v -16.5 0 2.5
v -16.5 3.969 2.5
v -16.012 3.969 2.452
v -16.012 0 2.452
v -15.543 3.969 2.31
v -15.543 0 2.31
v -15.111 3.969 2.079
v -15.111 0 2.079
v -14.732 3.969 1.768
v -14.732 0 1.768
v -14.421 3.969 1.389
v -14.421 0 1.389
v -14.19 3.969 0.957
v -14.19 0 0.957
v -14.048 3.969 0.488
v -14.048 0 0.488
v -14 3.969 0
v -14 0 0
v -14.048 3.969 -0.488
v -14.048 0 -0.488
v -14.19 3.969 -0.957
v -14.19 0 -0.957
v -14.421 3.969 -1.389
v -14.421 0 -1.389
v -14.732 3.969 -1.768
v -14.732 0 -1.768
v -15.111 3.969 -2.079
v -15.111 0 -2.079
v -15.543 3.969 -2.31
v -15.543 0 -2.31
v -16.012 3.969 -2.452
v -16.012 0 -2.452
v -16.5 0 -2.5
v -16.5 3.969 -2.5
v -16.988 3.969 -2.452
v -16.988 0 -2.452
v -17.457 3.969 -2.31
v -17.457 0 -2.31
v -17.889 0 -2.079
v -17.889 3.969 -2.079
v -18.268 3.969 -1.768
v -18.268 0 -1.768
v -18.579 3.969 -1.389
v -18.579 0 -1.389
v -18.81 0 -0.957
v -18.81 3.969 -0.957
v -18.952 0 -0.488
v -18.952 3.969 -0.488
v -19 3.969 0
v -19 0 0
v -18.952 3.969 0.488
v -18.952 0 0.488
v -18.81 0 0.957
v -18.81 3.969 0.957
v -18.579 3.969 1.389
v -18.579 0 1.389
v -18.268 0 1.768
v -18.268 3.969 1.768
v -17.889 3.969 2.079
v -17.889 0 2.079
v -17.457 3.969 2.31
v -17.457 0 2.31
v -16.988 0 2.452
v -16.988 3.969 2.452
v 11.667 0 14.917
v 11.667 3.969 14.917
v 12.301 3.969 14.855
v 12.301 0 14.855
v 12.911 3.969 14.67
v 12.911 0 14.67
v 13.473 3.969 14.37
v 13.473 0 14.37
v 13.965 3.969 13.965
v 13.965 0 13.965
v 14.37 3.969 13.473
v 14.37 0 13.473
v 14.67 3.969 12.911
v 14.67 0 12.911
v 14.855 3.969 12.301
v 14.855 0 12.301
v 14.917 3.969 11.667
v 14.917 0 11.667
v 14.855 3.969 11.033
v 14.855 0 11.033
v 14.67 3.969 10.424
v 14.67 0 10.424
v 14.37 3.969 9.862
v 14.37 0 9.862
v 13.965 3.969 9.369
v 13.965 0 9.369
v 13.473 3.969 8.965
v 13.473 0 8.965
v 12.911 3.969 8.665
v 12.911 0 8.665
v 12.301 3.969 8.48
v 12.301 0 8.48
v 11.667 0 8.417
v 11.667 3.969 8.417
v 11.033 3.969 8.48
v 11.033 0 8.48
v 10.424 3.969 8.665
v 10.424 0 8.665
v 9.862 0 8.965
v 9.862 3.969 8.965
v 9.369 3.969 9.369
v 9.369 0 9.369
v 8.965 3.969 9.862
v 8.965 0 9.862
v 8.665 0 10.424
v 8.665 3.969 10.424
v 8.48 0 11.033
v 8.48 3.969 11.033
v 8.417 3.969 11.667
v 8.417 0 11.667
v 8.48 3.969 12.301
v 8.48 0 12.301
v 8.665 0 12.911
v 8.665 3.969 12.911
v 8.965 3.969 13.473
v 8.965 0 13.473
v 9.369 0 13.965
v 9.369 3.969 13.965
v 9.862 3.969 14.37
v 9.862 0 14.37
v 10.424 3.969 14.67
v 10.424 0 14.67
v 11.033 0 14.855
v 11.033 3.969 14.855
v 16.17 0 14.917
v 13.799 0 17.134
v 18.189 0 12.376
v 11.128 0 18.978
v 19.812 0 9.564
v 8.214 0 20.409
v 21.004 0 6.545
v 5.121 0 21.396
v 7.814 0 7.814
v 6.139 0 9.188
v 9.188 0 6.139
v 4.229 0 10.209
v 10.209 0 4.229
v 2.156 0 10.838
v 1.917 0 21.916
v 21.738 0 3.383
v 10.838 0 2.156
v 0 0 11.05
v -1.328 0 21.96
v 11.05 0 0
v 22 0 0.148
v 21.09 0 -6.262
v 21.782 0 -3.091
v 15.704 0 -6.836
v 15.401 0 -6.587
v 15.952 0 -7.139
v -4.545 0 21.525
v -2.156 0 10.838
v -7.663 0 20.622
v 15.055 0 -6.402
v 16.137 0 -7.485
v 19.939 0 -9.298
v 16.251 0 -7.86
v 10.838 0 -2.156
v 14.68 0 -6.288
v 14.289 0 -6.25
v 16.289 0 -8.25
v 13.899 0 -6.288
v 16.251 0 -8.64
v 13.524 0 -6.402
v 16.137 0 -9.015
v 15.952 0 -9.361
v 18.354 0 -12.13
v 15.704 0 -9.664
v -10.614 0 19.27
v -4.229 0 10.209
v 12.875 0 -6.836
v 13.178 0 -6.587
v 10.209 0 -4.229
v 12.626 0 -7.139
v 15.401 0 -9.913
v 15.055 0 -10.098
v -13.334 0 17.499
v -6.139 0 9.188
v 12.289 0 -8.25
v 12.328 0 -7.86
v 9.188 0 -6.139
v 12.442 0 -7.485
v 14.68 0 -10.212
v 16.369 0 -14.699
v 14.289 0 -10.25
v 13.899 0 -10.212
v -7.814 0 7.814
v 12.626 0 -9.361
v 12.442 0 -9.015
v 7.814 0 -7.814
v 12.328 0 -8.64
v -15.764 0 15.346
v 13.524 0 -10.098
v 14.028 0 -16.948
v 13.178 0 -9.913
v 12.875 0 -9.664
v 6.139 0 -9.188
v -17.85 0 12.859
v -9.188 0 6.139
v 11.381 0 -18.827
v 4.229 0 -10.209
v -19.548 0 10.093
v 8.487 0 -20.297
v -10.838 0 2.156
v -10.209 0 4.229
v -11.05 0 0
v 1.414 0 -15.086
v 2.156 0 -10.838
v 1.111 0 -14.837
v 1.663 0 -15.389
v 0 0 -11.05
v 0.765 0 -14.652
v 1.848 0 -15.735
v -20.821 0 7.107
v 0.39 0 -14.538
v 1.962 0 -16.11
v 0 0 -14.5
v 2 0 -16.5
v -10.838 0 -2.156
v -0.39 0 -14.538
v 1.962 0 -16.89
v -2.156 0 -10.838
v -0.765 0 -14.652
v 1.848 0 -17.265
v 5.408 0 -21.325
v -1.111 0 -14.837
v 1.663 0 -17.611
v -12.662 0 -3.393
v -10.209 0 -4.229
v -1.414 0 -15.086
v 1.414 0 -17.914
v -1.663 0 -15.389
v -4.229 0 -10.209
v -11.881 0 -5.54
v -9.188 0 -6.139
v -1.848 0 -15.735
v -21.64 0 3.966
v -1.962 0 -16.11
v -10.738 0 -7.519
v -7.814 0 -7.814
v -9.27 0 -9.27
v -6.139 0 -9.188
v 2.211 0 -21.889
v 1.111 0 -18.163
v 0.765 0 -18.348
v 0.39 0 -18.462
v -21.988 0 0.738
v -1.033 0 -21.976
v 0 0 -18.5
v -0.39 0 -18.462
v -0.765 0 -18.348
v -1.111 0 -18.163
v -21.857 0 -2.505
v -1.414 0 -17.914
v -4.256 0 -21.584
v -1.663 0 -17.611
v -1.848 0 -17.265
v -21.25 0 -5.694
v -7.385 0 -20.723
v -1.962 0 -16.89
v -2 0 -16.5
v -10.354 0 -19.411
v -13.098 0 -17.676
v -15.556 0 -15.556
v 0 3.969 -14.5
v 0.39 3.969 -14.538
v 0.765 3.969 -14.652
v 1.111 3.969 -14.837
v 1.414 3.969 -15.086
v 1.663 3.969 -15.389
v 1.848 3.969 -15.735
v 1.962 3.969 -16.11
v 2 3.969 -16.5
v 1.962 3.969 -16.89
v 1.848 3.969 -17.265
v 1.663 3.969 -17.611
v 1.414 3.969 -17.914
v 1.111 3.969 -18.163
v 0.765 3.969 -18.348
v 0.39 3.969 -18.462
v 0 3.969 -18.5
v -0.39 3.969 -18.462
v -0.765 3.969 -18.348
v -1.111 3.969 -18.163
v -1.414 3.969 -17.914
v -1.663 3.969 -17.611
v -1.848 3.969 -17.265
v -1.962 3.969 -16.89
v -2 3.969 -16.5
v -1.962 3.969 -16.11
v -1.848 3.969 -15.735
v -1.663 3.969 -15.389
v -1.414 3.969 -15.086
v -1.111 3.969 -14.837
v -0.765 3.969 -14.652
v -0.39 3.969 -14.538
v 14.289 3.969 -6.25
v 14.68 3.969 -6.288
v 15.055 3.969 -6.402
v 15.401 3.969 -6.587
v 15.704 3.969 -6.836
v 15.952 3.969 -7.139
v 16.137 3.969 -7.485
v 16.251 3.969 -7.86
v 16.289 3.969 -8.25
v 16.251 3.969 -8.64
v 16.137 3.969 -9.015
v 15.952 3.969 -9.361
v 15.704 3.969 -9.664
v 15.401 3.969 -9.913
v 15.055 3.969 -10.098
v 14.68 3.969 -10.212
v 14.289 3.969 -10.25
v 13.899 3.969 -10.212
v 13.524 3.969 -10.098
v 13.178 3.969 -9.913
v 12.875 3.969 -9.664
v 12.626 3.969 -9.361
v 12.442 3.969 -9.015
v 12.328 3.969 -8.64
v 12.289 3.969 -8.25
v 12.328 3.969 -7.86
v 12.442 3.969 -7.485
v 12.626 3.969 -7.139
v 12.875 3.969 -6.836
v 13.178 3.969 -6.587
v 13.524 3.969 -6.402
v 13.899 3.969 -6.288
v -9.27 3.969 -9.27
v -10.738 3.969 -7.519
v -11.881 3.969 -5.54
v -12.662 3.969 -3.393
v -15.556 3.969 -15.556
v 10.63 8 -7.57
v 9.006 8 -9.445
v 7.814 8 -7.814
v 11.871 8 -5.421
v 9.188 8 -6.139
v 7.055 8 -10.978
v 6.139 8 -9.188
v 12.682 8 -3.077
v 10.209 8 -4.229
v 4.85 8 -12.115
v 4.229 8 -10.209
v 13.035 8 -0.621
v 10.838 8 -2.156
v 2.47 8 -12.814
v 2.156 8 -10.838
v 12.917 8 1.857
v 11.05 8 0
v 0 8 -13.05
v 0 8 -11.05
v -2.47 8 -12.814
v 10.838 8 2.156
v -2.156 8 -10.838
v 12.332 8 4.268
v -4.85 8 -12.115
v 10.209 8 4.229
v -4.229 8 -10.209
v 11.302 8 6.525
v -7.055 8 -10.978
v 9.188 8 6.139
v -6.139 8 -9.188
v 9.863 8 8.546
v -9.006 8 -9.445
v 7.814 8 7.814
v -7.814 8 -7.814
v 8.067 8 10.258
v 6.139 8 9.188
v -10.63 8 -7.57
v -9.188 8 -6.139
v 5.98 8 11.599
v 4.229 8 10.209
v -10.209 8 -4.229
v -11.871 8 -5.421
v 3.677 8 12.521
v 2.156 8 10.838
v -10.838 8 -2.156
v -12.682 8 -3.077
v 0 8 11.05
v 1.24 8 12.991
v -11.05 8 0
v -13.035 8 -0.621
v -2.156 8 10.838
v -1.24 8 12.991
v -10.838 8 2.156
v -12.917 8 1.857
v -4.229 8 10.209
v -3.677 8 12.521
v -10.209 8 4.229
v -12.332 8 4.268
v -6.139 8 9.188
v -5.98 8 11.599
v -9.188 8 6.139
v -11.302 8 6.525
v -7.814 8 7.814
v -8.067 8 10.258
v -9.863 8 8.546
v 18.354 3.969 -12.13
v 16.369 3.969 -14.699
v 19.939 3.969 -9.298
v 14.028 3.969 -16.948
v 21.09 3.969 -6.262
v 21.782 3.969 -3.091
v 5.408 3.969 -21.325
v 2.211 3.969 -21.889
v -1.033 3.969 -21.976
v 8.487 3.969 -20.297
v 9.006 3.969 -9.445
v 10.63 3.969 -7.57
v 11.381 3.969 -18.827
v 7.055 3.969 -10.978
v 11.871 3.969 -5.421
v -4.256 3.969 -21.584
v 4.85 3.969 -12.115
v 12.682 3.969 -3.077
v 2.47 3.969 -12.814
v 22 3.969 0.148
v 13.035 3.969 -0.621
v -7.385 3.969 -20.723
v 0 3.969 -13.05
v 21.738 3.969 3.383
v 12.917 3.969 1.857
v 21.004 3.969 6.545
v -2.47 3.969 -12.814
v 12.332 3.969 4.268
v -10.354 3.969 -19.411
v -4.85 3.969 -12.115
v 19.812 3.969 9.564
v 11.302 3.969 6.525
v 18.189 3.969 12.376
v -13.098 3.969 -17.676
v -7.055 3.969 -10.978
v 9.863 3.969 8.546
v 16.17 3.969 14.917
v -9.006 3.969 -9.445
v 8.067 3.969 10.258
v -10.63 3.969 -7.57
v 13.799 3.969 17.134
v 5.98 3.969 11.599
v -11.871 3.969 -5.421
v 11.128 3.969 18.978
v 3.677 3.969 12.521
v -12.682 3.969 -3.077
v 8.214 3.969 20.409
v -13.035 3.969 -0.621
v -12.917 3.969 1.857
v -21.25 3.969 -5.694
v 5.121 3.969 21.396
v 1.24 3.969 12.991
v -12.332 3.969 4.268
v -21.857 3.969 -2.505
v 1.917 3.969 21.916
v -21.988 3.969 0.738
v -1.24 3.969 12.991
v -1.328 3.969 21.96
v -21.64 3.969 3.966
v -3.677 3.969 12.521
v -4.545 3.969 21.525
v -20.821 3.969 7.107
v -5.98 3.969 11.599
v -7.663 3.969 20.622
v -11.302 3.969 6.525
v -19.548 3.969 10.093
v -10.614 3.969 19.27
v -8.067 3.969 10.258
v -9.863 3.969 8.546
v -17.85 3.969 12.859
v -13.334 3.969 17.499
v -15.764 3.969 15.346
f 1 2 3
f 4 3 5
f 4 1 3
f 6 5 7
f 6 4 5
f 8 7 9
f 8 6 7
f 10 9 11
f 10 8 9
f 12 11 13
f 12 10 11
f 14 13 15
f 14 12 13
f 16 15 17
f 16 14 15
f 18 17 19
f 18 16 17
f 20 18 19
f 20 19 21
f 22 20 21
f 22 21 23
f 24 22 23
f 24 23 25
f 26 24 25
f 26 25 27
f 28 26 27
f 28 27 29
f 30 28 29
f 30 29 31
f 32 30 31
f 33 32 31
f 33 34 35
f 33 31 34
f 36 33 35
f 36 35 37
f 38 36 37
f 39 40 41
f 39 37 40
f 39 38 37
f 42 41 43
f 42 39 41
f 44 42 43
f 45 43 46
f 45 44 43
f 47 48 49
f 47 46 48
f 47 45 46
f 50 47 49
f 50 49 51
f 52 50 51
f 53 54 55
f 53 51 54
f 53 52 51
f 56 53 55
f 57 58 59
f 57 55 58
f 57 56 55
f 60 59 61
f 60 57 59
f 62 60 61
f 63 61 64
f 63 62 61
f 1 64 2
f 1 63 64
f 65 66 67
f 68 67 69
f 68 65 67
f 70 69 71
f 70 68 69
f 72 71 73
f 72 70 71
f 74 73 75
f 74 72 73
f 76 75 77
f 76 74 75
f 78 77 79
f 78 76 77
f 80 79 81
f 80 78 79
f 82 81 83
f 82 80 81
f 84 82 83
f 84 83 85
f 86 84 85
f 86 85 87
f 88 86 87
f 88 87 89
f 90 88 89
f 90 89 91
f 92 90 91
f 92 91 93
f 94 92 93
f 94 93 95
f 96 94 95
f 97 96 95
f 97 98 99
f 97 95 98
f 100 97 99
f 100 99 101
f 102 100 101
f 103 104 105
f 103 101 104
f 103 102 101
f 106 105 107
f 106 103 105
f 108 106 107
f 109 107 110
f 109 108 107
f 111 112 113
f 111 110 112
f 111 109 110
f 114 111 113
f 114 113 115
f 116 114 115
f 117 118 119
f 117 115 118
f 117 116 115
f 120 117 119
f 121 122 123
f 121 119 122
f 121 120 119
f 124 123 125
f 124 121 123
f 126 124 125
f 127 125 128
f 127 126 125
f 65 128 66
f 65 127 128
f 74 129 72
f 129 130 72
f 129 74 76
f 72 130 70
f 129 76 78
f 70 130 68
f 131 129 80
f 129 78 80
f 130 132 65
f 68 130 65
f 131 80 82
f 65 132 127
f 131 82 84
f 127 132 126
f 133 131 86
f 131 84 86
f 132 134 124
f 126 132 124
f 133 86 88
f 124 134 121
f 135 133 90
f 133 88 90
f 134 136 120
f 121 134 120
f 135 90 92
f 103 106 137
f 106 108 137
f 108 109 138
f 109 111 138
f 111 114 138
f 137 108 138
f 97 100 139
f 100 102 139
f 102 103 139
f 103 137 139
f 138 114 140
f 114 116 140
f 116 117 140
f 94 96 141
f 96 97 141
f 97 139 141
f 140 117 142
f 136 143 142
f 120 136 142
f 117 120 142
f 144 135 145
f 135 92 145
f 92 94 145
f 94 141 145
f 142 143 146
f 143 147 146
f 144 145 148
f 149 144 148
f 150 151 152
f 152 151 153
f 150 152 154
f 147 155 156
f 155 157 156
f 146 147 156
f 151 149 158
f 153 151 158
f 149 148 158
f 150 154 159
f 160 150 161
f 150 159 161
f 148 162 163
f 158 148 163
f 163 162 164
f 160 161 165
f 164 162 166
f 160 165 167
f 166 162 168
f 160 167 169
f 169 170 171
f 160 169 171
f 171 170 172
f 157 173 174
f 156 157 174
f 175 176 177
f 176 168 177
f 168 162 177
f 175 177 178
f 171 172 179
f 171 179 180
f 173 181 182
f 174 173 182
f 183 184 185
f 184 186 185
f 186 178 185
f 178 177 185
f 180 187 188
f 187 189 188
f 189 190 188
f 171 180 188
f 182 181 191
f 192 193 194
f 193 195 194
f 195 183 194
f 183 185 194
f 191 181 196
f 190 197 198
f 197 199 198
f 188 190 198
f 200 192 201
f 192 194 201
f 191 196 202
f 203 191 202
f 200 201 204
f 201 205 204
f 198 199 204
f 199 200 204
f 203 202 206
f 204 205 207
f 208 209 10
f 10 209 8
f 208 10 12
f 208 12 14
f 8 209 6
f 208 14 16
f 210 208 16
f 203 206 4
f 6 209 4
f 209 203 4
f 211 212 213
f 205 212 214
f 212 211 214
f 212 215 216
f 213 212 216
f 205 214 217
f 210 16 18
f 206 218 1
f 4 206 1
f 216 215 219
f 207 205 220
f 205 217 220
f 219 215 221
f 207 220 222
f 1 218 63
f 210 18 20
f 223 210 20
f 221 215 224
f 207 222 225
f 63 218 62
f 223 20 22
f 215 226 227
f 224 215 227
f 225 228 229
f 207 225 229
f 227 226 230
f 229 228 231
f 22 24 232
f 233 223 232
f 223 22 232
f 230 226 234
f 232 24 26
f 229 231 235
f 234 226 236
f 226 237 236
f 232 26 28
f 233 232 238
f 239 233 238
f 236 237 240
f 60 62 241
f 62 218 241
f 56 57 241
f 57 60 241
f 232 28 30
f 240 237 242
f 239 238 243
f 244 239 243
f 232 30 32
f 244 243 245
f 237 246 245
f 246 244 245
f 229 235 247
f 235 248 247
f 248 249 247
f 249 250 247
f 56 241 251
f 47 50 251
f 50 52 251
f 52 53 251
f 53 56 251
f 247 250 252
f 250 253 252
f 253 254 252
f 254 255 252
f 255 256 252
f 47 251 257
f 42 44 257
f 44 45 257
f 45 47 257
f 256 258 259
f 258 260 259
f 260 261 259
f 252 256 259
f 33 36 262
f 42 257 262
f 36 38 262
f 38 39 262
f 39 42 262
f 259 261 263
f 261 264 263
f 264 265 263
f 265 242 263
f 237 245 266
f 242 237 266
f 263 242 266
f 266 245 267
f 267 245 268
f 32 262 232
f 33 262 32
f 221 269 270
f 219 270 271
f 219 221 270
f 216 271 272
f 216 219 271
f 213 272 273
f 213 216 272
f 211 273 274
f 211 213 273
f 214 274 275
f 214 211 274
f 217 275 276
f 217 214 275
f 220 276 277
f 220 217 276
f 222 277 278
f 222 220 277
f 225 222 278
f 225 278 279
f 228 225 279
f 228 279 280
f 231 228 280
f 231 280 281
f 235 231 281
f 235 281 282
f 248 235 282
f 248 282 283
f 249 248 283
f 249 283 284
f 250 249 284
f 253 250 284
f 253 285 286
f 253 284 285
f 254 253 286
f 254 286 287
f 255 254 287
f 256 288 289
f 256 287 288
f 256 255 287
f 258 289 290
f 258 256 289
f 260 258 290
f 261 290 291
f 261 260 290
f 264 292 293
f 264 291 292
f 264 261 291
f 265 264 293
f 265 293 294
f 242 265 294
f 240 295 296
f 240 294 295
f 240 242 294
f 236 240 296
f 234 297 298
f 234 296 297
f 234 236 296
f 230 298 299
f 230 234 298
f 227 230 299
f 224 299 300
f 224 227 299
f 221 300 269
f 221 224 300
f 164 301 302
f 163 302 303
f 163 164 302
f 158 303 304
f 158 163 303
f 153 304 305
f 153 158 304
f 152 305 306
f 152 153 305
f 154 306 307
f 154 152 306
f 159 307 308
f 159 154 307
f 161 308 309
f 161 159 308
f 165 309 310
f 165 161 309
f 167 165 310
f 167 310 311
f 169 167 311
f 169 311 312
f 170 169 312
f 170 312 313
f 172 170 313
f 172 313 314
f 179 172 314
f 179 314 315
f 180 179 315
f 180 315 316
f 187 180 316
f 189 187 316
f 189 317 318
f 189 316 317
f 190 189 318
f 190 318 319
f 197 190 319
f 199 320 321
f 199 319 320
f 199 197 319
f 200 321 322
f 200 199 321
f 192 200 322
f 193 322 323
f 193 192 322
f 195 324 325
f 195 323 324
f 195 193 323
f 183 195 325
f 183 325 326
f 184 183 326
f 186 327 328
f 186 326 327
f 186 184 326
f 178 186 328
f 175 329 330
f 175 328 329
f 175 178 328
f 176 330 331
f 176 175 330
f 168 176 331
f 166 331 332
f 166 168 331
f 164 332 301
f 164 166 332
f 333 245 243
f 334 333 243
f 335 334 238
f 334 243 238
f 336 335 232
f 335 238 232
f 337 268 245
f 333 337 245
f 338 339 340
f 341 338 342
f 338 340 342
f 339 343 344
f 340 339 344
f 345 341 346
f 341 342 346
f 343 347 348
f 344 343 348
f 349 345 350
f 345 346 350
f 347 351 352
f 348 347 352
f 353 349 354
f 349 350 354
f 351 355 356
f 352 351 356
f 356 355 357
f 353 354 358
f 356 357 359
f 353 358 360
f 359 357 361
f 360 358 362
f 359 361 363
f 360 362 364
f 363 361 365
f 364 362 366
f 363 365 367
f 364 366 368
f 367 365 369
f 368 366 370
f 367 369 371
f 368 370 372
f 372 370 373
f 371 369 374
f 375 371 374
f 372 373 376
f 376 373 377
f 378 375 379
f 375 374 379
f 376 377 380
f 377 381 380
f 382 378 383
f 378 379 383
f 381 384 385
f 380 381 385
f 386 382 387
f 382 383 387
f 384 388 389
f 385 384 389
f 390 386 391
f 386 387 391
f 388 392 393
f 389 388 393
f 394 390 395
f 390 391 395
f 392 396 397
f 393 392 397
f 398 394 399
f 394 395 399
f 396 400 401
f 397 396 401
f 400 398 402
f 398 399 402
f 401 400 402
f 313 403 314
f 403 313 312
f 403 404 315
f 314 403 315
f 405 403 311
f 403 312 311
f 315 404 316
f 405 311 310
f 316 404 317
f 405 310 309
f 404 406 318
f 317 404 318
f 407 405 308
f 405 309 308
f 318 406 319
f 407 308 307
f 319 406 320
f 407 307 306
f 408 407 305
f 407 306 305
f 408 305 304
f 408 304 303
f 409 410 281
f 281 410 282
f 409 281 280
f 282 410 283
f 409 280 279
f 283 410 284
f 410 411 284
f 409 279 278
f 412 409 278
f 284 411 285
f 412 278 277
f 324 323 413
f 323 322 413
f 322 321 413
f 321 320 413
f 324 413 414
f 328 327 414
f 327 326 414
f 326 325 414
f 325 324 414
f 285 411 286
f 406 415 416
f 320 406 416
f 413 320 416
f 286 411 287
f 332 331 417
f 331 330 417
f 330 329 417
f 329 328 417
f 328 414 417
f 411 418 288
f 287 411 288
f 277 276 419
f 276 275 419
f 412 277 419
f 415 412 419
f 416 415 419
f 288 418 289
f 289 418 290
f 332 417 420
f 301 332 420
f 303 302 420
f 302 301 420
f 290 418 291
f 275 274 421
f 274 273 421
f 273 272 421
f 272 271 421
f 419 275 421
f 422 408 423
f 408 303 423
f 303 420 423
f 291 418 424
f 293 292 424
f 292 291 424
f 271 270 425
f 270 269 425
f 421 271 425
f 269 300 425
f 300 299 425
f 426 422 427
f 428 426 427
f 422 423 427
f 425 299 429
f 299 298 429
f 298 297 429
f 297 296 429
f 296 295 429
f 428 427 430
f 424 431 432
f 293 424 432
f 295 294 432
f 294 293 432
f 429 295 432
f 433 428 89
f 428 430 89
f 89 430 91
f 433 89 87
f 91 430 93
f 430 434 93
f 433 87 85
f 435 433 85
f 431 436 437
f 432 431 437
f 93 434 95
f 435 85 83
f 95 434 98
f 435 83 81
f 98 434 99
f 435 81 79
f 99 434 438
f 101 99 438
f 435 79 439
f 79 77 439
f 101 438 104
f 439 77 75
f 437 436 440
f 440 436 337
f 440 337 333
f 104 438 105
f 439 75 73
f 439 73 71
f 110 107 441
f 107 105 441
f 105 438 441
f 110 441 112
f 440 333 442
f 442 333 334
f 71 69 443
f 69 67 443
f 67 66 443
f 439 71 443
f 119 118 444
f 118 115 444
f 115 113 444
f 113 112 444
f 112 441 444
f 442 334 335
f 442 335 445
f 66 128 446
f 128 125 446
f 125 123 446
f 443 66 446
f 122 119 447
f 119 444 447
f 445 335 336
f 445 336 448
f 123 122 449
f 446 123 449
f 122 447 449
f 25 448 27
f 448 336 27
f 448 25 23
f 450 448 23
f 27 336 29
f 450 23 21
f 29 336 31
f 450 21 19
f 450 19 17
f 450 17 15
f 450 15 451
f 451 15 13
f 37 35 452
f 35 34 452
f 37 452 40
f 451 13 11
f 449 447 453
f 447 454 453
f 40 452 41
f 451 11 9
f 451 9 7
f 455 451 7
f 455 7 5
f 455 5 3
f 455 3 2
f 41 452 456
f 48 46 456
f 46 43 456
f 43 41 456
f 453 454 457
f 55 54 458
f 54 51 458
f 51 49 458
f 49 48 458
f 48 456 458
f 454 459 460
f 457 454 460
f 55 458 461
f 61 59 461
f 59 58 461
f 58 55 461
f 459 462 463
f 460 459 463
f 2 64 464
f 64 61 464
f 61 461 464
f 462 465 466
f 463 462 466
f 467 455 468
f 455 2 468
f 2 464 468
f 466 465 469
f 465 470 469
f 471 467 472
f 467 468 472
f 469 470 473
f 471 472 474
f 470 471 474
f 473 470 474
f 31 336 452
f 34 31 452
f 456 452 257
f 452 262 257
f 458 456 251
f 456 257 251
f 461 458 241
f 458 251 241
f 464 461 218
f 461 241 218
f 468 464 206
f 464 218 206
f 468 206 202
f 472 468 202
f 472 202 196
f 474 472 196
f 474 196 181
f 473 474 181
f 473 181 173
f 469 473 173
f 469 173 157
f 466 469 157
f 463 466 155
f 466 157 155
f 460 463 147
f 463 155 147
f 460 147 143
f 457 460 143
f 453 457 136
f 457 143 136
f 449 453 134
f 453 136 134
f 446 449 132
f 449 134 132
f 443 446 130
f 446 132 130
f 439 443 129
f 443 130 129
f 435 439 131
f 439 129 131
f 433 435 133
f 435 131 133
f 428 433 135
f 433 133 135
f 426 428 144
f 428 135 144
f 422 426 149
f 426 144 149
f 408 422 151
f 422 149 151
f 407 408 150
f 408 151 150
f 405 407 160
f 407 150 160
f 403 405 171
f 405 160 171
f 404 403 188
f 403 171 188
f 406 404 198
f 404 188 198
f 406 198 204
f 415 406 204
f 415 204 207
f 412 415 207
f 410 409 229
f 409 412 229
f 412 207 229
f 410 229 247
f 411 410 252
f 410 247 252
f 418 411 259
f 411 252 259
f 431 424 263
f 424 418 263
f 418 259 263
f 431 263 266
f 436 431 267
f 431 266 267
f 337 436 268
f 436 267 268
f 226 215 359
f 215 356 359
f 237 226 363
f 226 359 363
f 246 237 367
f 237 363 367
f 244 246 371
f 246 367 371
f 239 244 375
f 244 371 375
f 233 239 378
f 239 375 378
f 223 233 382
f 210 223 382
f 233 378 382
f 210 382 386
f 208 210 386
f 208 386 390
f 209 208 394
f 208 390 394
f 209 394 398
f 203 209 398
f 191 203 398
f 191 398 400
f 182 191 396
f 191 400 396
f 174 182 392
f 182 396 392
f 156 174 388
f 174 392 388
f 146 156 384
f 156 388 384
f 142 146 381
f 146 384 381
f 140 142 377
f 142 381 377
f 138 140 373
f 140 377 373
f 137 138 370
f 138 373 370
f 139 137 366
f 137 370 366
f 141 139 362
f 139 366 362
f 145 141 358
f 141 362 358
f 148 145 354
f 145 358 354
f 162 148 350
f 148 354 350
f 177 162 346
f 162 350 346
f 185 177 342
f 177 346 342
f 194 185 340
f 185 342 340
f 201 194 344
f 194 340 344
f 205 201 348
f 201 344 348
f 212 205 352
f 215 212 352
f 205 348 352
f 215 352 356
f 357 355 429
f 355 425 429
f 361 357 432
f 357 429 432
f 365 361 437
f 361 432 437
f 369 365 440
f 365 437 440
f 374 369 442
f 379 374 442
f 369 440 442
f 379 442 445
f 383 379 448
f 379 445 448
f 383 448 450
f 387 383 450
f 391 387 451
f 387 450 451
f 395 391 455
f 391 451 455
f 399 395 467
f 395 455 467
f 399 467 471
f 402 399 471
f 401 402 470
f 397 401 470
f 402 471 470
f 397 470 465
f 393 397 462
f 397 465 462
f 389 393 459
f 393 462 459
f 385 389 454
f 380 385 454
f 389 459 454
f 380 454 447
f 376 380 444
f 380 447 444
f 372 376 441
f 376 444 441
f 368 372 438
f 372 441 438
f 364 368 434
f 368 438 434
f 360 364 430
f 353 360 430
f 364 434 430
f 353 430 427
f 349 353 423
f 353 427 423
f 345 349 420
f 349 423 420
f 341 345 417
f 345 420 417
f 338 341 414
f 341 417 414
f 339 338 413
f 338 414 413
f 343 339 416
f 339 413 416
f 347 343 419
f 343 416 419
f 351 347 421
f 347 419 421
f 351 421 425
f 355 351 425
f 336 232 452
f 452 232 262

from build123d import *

# Parameters (mm, degrees)
SKETCH3_R          = 2.5
SKETCH3_R_2        = 3.25
SKETCH3_R_3        = 2
CUT_EXTRUDE1_DEPTH = 10


with BuildPart() as part:
    # Sketch1 → Revolve1 (revolve)
    with BuildSketch(Plane.XY, mode=Mode.PRIVATE) as revolve1_sk:
        Polygon((11.05, 0), (11.05, 8), (13.05, 8), (13.05, 3.969255392), (22, 3.969255392), (22, 0), align=None)
    revolve(revolve1_sk.sketch.rotate(Axis((0, 0, 0), (0, 1, 0)), 90), axis=Axis((0, 0, 0), (0, 1, 0)))

    # Sketch3 → Cut-Extrude1 (cut)
    with BuildSketch(Plane(origin=(0, 0, 0), x_dir=(1, 0, 0), z_dir=(0, 1, 0))):
        with Locations(Location((-16.5, 0, 0), (0, 0, 270))):
            Circle(SKETCH3_R)
        with Locations(Location((11.66726189, -11.66726189, 0), (0, 0, 270))):
            Circle(SKETCH3_R_2)
        with Locations(Location((14.289419162, 8.25, 0), (0, 0, 270))):
            Circle(SKETCH3_R_3)
        with Locations(Location((0, 16.5, 0), (0, 0, 270))):
            Circle(SKETCH3_R_3)
        with BuildLine():
            Line((-16.442045207, 16.442045207), (-9.269550975, 9.269550975))
            ThreePointArc((-9.269550975, 9.269550975), (-11.352835017, 6.554562353), (-12.662442113, 3.392891138))
            Line((-12.662442113, 3.392891138), (-22.460251443, 6.018206236))
            ThreePointArc((-22.460251443, 6.018206236), (-20.137310542, 11.626281662), (-16.442045207, 16.442045207))
        make_face()
    extrude(amount=CUT_EXTRUDE1_DEPTH, mode=Mode.SUBTRACT)


solid = part.part
